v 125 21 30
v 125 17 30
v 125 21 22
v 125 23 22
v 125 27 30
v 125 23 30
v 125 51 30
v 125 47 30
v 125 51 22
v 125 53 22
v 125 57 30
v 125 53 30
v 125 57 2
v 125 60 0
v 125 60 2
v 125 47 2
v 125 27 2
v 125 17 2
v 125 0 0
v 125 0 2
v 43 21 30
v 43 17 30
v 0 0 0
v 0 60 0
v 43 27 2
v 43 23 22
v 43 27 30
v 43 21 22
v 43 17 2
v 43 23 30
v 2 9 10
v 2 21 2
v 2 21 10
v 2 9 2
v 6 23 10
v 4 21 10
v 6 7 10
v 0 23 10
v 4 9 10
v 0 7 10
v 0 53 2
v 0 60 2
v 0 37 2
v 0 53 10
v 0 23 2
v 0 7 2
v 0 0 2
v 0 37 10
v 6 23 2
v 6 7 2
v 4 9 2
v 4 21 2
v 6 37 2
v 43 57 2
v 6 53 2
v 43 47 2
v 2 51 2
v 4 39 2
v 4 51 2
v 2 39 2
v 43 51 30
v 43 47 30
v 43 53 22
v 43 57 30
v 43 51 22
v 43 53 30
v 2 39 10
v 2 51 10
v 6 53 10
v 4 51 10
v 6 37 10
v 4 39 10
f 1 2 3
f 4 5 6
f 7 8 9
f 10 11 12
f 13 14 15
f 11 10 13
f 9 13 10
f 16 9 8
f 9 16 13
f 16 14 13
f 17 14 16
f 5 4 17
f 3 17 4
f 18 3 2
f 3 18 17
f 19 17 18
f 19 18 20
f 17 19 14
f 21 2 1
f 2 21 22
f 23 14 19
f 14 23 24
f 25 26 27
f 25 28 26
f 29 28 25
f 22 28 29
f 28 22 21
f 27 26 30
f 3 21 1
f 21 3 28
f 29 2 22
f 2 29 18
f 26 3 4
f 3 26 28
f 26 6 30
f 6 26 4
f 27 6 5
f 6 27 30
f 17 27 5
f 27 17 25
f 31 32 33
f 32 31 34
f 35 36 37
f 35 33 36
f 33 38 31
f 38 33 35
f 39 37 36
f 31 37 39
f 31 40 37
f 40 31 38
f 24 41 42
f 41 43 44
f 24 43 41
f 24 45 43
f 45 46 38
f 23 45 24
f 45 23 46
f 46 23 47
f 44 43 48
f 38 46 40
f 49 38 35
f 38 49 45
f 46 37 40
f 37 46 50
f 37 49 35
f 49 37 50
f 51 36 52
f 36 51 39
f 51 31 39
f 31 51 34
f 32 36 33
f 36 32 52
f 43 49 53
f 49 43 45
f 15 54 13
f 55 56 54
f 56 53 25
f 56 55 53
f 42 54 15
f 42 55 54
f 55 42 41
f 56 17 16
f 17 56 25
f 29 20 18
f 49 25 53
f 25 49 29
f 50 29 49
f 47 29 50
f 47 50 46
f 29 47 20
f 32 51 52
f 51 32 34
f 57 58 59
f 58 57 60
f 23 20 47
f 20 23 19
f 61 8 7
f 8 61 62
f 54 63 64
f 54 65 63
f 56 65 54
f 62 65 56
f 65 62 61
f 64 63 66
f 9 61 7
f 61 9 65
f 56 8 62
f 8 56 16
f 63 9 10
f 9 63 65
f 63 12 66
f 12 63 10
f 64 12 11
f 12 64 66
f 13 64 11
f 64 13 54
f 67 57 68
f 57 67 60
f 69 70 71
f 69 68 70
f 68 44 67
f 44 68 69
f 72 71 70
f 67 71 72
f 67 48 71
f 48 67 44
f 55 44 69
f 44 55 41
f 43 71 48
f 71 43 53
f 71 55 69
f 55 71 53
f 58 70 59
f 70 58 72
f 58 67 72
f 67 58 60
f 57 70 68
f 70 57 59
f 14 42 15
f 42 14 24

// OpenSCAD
// file: ../cardshowcase.scad
module base_tarjeta(desplazamiento, posicion_tarjeta, longitud_tarjeta, altura_borde_tarjeta, altura_interior_tarjeta)
{
    color("purple") translate([ posicion_tarjeta, desplazamiento + 1, 0 ])
        cube([ longitud_tarjeta, 4, altura_borde_tarjeta + 2 ]);

    color("pink") translate([ posicion_tarjeta, desplazamiento + 5, 0 ])
        cube([ longitud_tarjeta, 2, altura_interior_tarjeta + 2 ]);

    color("purple") translate([ posicion_tarjeta, desplazamiento + 7, 0 ])
        cube([ longitud_tarjeta, 4, altura_borde_tarjeta + 2 ]);
}

module base_tarjeta_corta(desplazamiento, posicion_tarjeta, longitud_tarjeta, altura_borde_tarjeta,
                          altura_interior_tarjeta, tab_size)
{
    color("purple") translate([ posicion_tarjeta, desplazamiento + 1, 0 ])
        cube([ tab_size, 4, altura_borde_tarjeta + 2 ]);

    color("pink") translate([ posicion_tarjeta, desplazamiento + 5, 0 ])
        cube([ tab_size, 2, altura_interior_tarjeta + 2 ]);

    color("purple") translate([ posicion_tarjeta, desplazamiento + 7, 0 ])
        cube([ tab_size, 4, altura_borde_tarjeta + 2 ]);

    color("purple") translate([ longitud_tarjeta + posicion_tarjeta - tab_size, desplazamiento + 1, 0 ])
        cube([ tab_size, 4, altura_borde_tarjeta + 2 ]);

    color("pink") translate([ longitud_tarjeta + posicion_tarjeta - tab_size, desplazamiento + 5, 0 ])
        cube([ tab_size, 2, altura_interior_tarjeta + 2 ]);

    color("purple") translate([ longitud_tarjeta + posicion_tarjeta - tab_size, desplazamiento + 7, 0 ])
        cube([ tab_size, 4, altura_borde_tarjeta + 2 ]);
}

module soporte_tarjeta(tipo, size)
{
    if (tipo == "ISA8")
    {
        desplazamiento = 2;
        posicion_tarjeta = 27;
        longitud_tarjeta = 82;
        altura_borde_tarjeta = 28;
        altura_interior_tarjeta = 20;

        if (size == 0)
        {
            base_tarjeta(desplazamiento, posicion_tarjeta, longitud_tarjeta, altura_borde_tarjeta,
                         altura_interior_tarjeta);
        }
        else
        {
            base_tarjeta_corta(desplazamiento, posicion_tarjeta, longitud_tarjeta, altura_borde_tarjeta,
                               altura_interior_tarjeta, size);
        }
    }
    else if (tipo == "ISA16")
    {
        soporte_tarjeta("ISA8", size);

        desplazamiento = 2;
        posicion_tarjeta = 28 + 81 + 5;
        longitud_tarjeta = 48;
        altura_borde_tarjeta = 28;
        altura_interior_tarjeta = 20;

        if (size == 0)
        {
            base_tarjeta(desplazamiento, posicion_tarjeta, longitud_tarjeta, altura_borde_tarjeta,
                         altura_interior_tarjeta);
        }
        else
        {
            base_tarjeta_corta(desplazamiento, posicion_tarjeta, longitud_tarjeta, altura_borde_tarjeta,
                               altura_interior_tarjeta, size);
        }
    }
    else if (tipo == "VLB")
    {
        soporte_tarjeta("ISA16", size);

        desplazamiento = 2;
        posicion_tarjeta = 28 + 135 + 8;
        longitud_tarjeta = 75;
        altura_borde_tarjeta = 28;
        altura_interior_tarjeta = 20;

        if (size == 0)
        {
            base_tarjeta(desplazamiento, posicion_tarjeta, longitud_tarjeta, altura_borde_tarjeta,
                         altura_interior_tarjeta);
        }
        else
        {
            base_tarjeta_corta(desplazamiento, posicion_tarjeta, longitud_tarjeta, altura_borde_tarjeta,
                               altura_interior_tarjeta, size);
        }
    }
    else if (tipo == "PCI")
    {
        desplazamiento = 16;
        posicion_tarjeta = 43;
        longitud_tarjeta = 82;
        altura_borde_tarjeta = 28;
        altura_interior_tarjeta = 20;

        if (size == 0)
        {
            base_tarjeta(desplazamiento, posicion_tarjeta, longitud_tarjeta, altura_borde_tarjeta,
                         altura_interior_tarjeta);
        }
        else
        {
            base_tarjeta_corta(desplazamiento, posicion_tarjeta, longitud_tarjeta, altura_borde_tarjeta,
                               altura_interior_tarjeta, size);
        }
    }
    else if (tipo == "PCIe16")
    {
        desplazamiento = 16;
        posicion_tarjeta = 50;
        longitud_tarjeta = 85;
        altura_borde_tarjeta = 24;
        altura_interior_tarjeta = 16;

        if (size == 0)
        {
            base_tarjeta(desplazamiento, posicion_tarjeta, longitud_tarjeta, altura_borde_tarjeta,
                         altura_interior_tarjeta);
        }
        else
        {
            base_tarjeta_corta(desplazamiento, posicion_tarjeta, longitud_tarjeta, altura_borde_tarjeta,
                               altura_interior_tarjeta, size);
        }
    }
    else if (tipo == "PCIe8")
    {
        desplazamiento = 16;
        posicion_tarjeta = 50;
        longitud_tarjeta = 52;
        altura_borde_tarjeta = 24;
        altura_interior_tarjeta = 16;

        if (size == 0)
        {
            base_tarjeta(desplazamiento, posicion_tarjeta, longitud_tarjeta, altura_borde_tarjeta,
                         altura_interior_tarjeta);
        }
        else
        {
            base_tarjeta_corta(desplazamiento, posicion_tarjeta, longitud_tarjeta, altura_borde_tarjeta,
                               altura_interior_tarjeta, size);
        }
    }
    else if (tipo == "PCIe4")
    {
        desplazamiento = 16;
        posicion_tarjeta = 50;
        longitud_tarjeta = 35;
        altura_borde_tarjeta = 24;
        altura_interior_tarjeta = 16;

        if (size == 0)
        {
            base_tarjeta(desplazamiento, posicion_tarjeta, longitud_tarjeta, altura_borde_tarjeta,
                         altura_interior_tarjeta);
        }
        else
        {
            base_tarjeta_corta(desplazamiento, posicion_tarjeta, longitud_tarjeta, altura_borde_tarjeta,
                               altura_interior_tarjeta, size);
        }
    }
    else if (tipo == "PCIe1")
    {
        desplazamiento = 16;
        posicion_tarjeta = 50;
        longitud_tarjeta = 21;
        altura_borde_tarjeta = 24;
        altura_interior_tarjeta = 16;

        if (size == 0)
        {
            base_tarjeta(desplazamiento, posicion_tarjeta, longitud_tarjeta, altura_borde_tarjeta,
                         altura_interior_tarjeta);
        }
        else
        {
            base_tarjeta_corta(desplazamiento, posicion_tarjeta, longitud_tarjeta, altura_borde_tarjeta,
                               altura_interior_tarjeta, size);
        }
    }
    else if (tipo == "AGP")
    {
        desplazamiento = 16;
        posicion_tarjeta = 70;
        longitud_tarjeta = 68;
        altura_borde_tarjeta = 28;
        altura_interior_tarjeta = 20;

        if (size == 0)
        {
            base_tarjeta(desplazamiento, posicion_tarjeta, longitud_tarjeta, altura_borde_tarjeta,
                         altura_interior_tarjeta);
        }
        else
        {
            base_tarjeta_corta(desplazamiento, posicion_tarjeta, longitud_tarjeta, altura_borde_tarjeta,
                               altura_interior_tarjeta, size);
        }
    }
    else if (tipo == "EISA")
    {
        desplazamiento = 2;
        posicion_tarjeta = 27;
        longitud_tarjeta = 52 + 83;
        altura_borde_tarjeta = 28;
        altura_interior_tarjeta = 15;

        if (size == 0)
        {
            base_tarjeta(desplazamiento, posicion_tarjeta, longitud_tarjeta, altura_borde_tarjeta,
                         altura_interior_tarjeta);
        }
        else
        {
            base_tarjeta_corta(desplazamiento, posicion_tarjeta, longitud_tarjeta, altura_borde_tarjeta,
                               altura_interior_tarjeta, size);
        }
    }
}

module base_placa(tipo)
{
    if (tipo == "ISA8")
    {
        color("cyan") cube([ 109, 30, 2 ]);
    }
    else if (tipo == "ISA16")
    {
        color("cyan") cube([ 162, 30, 2 ]);
    }
    else if (tipo == "VLB")
    {
        color("cyan") cube([ 246, 30, 2 ]);
    }
    else if (tipo == "PCI")
    {
        color("cyan") cube([ 125, 30, 2 ]);
    }
    else if (tipo == "PCIe16")
    {
        color("cyan") cube([ 135, 30, 2 ]);
    }
    else if (tipo == "PCIe8")
    {
        color("cyan") cube([ 102, 30, 2 ]);
    }
    else if (tipo == "PCIe4")
    {
        color("cyan") cube([ 85, 30, 2 ]);
    }
    else if (tipo == "PCIe1")
    {
        color("cyan") cube([ 71, 30, 2 ]);
    }
    else if (tipo == "AGP")
    {
        color("cyan") cube([ 138, 30, 2 ]);
    }
    else if (tipo == "EISA")
    {
        color("cyan") cube([ 162, 30, 2 ]);
    }
    else if (is_num(tipo))
    {
        color("cyan") cube([ tipo, 30, 2]);
    }
}

override_base = undef;

module base(tipo)
{
    if (override_base == undef)
    {
        base_placa(tipo);
    }
    else
    {
        base_placa(override_base);
    }
}

module single_slot(tipo, position, size = 0)
{
    displacement = position * 30;

    color("red") translate([ 0, 7 + displacement, 0 ]) cube([ 2, 16, 10 ]);

    color("red") translate([ 4, 7 + displacement, 0 ]) cube([ 2, 16, 10 ]);

    color("red") translate([ 2, 7 + displacement, 0 ]) cube([ 2, 2, 10 ]);

    color("red") translate([ 2, 21 + displacement, 0 ]) cube([ 2, 2, 10 ]);

    translate([ 0, displacement, 0 ]) soporte_tarjeta(tipo, size);
    translate([ 0, displacement, 0 ]) base(tipo);
}
// main file
include <../cardshowcase.scad>

for ( i = [0 : 1] ){
    single_slot("PCI", i);
}
